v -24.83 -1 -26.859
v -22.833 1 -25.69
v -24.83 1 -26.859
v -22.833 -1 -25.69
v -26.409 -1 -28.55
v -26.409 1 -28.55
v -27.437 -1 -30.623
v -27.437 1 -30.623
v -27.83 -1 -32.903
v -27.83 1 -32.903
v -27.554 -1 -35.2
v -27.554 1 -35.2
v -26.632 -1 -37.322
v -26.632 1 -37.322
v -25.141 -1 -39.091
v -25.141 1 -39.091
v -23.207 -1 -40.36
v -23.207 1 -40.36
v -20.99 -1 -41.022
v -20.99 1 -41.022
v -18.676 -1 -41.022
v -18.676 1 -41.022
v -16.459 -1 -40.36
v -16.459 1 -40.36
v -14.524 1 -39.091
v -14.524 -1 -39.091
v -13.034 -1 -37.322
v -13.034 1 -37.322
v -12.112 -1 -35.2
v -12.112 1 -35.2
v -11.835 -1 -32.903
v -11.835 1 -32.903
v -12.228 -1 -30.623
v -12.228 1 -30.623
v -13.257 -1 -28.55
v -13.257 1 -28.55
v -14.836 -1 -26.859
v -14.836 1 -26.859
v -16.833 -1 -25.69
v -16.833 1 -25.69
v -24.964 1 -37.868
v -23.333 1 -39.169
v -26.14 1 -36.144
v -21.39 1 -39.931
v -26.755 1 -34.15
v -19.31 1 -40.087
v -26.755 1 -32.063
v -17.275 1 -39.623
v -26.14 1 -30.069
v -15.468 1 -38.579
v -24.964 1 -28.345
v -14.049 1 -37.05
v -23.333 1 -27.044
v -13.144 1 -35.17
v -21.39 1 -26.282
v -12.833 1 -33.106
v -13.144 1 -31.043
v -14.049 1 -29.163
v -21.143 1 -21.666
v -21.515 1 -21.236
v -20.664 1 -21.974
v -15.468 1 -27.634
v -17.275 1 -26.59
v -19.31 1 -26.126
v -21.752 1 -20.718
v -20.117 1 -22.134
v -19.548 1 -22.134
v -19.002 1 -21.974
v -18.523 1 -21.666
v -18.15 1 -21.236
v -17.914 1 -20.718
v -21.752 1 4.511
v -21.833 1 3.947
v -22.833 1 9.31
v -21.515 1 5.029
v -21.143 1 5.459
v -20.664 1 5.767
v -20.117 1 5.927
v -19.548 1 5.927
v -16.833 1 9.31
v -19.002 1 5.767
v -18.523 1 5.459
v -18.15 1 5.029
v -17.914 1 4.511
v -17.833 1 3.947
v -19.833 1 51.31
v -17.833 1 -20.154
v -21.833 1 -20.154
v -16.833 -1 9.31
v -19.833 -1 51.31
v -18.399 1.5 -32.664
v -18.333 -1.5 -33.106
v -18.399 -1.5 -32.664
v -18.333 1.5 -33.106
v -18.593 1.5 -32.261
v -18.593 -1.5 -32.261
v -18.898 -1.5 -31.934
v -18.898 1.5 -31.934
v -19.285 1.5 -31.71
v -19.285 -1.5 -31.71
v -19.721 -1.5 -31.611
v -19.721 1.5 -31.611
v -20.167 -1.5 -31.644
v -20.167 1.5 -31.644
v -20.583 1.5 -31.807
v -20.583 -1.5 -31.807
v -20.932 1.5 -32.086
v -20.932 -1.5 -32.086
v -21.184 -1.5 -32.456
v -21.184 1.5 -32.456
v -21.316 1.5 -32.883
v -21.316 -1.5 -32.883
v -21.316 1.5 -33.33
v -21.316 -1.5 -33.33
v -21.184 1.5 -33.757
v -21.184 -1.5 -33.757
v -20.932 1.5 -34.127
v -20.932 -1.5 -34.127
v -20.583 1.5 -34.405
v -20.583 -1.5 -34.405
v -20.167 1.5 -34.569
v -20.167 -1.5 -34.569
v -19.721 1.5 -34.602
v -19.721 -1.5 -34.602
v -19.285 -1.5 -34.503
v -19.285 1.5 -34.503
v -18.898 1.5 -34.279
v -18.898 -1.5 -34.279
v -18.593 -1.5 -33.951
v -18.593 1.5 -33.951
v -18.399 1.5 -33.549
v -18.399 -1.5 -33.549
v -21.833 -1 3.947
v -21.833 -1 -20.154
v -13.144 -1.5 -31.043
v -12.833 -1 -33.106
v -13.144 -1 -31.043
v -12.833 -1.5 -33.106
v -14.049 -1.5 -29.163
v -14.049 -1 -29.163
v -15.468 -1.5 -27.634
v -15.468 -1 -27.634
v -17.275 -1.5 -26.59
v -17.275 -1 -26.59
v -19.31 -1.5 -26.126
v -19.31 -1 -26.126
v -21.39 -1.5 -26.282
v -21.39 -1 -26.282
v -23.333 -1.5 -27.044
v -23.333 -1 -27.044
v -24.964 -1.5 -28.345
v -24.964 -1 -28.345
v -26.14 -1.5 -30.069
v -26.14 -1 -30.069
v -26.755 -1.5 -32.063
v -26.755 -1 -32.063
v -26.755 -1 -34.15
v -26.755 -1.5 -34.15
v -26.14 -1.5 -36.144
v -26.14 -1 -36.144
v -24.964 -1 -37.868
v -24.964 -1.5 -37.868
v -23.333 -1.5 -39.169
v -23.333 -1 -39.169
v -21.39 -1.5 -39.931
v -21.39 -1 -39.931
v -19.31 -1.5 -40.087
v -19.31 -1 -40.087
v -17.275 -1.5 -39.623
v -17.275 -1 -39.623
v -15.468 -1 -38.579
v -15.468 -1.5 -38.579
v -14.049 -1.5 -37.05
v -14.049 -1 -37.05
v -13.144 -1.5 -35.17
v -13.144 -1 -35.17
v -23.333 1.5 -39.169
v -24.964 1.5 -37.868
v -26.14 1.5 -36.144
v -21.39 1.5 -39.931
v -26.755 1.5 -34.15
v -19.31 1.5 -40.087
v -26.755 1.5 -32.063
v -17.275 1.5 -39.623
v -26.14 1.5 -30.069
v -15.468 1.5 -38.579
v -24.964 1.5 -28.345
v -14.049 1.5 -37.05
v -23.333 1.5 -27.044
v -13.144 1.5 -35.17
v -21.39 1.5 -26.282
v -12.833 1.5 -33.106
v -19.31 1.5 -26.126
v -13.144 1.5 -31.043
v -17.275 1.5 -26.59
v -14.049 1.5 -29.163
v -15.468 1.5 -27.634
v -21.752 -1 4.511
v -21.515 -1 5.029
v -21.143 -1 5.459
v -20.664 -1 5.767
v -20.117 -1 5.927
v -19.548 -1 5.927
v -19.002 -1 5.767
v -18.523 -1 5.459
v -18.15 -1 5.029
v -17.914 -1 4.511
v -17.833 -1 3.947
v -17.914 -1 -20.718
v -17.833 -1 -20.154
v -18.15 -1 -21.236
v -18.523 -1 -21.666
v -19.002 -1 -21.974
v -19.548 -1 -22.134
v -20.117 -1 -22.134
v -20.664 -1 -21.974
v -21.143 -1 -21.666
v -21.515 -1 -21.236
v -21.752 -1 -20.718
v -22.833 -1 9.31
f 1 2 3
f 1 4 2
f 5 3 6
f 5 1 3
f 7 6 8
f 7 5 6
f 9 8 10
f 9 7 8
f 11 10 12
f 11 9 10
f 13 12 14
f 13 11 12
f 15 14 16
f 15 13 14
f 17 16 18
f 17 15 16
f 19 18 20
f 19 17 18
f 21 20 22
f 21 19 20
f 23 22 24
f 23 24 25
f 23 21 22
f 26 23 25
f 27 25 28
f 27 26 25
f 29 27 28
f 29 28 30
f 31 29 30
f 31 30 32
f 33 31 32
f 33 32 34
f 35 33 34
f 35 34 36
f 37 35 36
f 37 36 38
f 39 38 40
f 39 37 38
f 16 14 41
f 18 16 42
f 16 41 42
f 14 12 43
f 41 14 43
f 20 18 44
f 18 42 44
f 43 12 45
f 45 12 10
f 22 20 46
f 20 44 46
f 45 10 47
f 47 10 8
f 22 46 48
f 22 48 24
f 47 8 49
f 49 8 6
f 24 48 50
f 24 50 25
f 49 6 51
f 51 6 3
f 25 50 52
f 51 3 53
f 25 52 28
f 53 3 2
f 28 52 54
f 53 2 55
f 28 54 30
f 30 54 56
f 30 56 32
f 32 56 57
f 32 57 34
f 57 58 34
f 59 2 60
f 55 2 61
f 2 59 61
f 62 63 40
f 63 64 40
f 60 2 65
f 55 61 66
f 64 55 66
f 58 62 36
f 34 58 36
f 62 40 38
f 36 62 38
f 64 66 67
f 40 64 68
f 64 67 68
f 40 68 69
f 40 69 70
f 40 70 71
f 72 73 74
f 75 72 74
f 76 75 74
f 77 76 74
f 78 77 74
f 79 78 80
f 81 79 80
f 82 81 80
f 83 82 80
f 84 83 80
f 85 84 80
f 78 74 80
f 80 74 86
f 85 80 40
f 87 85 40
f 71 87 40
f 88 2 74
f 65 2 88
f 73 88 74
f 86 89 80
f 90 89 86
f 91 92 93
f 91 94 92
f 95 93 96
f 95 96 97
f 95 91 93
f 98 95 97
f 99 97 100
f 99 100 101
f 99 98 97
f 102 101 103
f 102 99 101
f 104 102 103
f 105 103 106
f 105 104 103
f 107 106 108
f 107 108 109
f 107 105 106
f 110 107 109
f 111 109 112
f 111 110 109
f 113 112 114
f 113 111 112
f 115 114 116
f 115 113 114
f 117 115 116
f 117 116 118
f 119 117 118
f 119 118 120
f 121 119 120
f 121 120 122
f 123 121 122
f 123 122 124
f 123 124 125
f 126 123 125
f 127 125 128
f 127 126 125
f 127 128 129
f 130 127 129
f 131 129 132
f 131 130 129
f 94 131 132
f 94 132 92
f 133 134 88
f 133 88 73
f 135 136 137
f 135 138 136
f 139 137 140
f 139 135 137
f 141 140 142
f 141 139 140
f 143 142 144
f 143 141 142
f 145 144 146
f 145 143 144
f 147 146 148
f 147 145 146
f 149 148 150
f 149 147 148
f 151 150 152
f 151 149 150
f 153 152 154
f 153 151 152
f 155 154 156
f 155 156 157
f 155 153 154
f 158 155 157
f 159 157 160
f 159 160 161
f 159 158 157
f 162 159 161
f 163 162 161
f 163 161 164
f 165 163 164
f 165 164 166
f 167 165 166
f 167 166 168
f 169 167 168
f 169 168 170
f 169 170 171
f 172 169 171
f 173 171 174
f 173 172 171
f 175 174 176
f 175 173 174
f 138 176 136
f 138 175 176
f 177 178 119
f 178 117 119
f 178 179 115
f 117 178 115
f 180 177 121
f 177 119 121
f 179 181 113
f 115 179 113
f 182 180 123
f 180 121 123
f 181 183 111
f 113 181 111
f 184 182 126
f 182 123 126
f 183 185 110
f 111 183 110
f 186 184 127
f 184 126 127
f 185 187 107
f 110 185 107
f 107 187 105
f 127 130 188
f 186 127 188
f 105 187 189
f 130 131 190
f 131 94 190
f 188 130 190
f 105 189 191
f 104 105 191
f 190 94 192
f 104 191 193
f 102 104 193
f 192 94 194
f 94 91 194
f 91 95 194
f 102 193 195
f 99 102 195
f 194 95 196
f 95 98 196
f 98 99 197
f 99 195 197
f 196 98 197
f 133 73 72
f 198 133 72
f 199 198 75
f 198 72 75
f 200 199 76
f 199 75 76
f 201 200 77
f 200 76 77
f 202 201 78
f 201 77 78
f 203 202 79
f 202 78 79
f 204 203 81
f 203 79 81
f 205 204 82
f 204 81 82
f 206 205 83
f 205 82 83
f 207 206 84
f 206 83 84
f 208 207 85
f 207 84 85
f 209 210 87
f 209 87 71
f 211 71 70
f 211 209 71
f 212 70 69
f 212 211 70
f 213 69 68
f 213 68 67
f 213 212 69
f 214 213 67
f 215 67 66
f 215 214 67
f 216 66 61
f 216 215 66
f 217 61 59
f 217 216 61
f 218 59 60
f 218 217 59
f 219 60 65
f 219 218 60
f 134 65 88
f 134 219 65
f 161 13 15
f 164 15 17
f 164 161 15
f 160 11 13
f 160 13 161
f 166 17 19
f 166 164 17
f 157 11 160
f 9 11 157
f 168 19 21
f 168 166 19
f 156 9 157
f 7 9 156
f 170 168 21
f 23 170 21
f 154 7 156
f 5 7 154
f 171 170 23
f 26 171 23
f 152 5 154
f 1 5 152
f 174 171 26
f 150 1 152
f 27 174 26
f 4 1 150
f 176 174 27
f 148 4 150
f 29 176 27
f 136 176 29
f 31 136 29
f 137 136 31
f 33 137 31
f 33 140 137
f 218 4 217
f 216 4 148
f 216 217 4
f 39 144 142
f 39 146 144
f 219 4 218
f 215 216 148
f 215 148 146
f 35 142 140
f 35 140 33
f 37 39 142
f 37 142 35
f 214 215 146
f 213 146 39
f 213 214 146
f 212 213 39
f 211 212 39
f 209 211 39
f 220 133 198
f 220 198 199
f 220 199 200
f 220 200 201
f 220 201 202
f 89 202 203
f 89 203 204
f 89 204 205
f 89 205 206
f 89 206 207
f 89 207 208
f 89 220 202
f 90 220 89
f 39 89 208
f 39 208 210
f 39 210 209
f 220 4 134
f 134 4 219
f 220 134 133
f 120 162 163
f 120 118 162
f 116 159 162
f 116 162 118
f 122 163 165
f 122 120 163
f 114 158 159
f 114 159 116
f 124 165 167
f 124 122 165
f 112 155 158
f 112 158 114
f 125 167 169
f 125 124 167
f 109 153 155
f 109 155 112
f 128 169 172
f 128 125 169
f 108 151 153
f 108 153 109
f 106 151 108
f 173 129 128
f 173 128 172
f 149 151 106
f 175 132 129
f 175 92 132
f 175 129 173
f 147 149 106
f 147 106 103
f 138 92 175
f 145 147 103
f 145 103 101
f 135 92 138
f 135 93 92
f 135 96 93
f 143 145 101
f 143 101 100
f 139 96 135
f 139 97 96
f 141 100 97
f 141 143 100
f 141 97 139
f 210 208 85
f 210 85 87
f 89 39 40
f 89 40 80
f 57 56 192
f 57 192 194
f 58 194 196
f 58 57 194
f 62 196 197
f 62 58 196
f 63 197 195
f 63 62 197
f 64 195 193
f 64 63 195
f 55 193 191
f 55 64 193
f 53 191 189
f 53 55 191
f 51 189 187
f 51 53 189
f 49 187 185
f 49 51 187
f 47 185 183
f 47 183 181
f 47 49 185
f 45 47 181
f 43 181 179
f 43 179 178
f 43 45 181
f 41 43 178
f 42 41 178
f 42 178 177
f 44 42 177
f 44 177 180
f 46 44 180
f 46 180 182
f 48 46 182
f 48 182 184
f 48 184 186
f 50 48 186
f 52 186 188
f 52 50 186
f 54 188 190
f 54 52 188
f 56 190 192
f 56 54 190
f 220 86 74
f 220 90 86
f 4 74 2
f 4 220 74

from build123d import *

# Parameters (mm, degrees)
F0_R     = 7
F0_R_2   = 1.5
F1_DEPTH = 1.5
F2_DEPTH = 1


# Not quite as in the source:
# - a feature names something its author has since deleted; it is built from what else it names


with BuildPart() as f1:
    # F0 (on Front) → F1 (new body, symmetric)
    with BuildSketch(Plane.XZ):
        with Locations((-19.8327995853, -33.1064267996)):
            Circle(F0_R)
        with Locations((-19.8327995853, -33.1064267996)):
            Circle(F0_R_2, mode=Mode.SUBTRACT)
    extrude(amount=F1_DEPTH, both=True)

    # F0 (on Front) → F2 (join, symmetric)
    with BuildSketch(Plane.XZ):
        with BuildLine():
            ThreePointArc((-22.8327995853, -25.6902283125), (-19.8327995853, -41.1064267996), (-16.8327995853, -25.6902283125))
            Line((-16.8327995853, -25.6902283125), (-16.8327995853, 9.3097716875))
            Line((-16.8327995853, 9.3097716875), (-19.8327995853, 51.3097716875))
            Line((-19.8327995853, 51.3097716875), (-22.8327995853, 9.3097716875))
            Line((-22.8327995853, 9.3097716875), (-22.8327995853, -25.6902283125))
        make_face()
        with Locations((-19.8327995853, -33.1064267996)):
            Circle(F0_R, mode=Mode.SUBTRACT)
        with BuildLine():
            ThreePointArc((-21.8327995853, 3.9472361095), (-19.8327995853, 5.9472361095), (-17.8327995853, 3.9472361095))
            Line((-17.8327995853, 3.9472361095), (-17.8327995853, -20.1542899013))
            ThreePointArc((-17.8327995853, -20.1542899013), (-19.8327995853, -22.1542899013), (-21.8327995853, -20.1542899013))
            Line((-21.8327995853, -20.1542899013), (-21.8327995853, 3.9472361095))
        make_face(mode=Mode.SUBTRACT)
    extrude(amount=F2_DEPTH, both=True)


solid = f1.part
